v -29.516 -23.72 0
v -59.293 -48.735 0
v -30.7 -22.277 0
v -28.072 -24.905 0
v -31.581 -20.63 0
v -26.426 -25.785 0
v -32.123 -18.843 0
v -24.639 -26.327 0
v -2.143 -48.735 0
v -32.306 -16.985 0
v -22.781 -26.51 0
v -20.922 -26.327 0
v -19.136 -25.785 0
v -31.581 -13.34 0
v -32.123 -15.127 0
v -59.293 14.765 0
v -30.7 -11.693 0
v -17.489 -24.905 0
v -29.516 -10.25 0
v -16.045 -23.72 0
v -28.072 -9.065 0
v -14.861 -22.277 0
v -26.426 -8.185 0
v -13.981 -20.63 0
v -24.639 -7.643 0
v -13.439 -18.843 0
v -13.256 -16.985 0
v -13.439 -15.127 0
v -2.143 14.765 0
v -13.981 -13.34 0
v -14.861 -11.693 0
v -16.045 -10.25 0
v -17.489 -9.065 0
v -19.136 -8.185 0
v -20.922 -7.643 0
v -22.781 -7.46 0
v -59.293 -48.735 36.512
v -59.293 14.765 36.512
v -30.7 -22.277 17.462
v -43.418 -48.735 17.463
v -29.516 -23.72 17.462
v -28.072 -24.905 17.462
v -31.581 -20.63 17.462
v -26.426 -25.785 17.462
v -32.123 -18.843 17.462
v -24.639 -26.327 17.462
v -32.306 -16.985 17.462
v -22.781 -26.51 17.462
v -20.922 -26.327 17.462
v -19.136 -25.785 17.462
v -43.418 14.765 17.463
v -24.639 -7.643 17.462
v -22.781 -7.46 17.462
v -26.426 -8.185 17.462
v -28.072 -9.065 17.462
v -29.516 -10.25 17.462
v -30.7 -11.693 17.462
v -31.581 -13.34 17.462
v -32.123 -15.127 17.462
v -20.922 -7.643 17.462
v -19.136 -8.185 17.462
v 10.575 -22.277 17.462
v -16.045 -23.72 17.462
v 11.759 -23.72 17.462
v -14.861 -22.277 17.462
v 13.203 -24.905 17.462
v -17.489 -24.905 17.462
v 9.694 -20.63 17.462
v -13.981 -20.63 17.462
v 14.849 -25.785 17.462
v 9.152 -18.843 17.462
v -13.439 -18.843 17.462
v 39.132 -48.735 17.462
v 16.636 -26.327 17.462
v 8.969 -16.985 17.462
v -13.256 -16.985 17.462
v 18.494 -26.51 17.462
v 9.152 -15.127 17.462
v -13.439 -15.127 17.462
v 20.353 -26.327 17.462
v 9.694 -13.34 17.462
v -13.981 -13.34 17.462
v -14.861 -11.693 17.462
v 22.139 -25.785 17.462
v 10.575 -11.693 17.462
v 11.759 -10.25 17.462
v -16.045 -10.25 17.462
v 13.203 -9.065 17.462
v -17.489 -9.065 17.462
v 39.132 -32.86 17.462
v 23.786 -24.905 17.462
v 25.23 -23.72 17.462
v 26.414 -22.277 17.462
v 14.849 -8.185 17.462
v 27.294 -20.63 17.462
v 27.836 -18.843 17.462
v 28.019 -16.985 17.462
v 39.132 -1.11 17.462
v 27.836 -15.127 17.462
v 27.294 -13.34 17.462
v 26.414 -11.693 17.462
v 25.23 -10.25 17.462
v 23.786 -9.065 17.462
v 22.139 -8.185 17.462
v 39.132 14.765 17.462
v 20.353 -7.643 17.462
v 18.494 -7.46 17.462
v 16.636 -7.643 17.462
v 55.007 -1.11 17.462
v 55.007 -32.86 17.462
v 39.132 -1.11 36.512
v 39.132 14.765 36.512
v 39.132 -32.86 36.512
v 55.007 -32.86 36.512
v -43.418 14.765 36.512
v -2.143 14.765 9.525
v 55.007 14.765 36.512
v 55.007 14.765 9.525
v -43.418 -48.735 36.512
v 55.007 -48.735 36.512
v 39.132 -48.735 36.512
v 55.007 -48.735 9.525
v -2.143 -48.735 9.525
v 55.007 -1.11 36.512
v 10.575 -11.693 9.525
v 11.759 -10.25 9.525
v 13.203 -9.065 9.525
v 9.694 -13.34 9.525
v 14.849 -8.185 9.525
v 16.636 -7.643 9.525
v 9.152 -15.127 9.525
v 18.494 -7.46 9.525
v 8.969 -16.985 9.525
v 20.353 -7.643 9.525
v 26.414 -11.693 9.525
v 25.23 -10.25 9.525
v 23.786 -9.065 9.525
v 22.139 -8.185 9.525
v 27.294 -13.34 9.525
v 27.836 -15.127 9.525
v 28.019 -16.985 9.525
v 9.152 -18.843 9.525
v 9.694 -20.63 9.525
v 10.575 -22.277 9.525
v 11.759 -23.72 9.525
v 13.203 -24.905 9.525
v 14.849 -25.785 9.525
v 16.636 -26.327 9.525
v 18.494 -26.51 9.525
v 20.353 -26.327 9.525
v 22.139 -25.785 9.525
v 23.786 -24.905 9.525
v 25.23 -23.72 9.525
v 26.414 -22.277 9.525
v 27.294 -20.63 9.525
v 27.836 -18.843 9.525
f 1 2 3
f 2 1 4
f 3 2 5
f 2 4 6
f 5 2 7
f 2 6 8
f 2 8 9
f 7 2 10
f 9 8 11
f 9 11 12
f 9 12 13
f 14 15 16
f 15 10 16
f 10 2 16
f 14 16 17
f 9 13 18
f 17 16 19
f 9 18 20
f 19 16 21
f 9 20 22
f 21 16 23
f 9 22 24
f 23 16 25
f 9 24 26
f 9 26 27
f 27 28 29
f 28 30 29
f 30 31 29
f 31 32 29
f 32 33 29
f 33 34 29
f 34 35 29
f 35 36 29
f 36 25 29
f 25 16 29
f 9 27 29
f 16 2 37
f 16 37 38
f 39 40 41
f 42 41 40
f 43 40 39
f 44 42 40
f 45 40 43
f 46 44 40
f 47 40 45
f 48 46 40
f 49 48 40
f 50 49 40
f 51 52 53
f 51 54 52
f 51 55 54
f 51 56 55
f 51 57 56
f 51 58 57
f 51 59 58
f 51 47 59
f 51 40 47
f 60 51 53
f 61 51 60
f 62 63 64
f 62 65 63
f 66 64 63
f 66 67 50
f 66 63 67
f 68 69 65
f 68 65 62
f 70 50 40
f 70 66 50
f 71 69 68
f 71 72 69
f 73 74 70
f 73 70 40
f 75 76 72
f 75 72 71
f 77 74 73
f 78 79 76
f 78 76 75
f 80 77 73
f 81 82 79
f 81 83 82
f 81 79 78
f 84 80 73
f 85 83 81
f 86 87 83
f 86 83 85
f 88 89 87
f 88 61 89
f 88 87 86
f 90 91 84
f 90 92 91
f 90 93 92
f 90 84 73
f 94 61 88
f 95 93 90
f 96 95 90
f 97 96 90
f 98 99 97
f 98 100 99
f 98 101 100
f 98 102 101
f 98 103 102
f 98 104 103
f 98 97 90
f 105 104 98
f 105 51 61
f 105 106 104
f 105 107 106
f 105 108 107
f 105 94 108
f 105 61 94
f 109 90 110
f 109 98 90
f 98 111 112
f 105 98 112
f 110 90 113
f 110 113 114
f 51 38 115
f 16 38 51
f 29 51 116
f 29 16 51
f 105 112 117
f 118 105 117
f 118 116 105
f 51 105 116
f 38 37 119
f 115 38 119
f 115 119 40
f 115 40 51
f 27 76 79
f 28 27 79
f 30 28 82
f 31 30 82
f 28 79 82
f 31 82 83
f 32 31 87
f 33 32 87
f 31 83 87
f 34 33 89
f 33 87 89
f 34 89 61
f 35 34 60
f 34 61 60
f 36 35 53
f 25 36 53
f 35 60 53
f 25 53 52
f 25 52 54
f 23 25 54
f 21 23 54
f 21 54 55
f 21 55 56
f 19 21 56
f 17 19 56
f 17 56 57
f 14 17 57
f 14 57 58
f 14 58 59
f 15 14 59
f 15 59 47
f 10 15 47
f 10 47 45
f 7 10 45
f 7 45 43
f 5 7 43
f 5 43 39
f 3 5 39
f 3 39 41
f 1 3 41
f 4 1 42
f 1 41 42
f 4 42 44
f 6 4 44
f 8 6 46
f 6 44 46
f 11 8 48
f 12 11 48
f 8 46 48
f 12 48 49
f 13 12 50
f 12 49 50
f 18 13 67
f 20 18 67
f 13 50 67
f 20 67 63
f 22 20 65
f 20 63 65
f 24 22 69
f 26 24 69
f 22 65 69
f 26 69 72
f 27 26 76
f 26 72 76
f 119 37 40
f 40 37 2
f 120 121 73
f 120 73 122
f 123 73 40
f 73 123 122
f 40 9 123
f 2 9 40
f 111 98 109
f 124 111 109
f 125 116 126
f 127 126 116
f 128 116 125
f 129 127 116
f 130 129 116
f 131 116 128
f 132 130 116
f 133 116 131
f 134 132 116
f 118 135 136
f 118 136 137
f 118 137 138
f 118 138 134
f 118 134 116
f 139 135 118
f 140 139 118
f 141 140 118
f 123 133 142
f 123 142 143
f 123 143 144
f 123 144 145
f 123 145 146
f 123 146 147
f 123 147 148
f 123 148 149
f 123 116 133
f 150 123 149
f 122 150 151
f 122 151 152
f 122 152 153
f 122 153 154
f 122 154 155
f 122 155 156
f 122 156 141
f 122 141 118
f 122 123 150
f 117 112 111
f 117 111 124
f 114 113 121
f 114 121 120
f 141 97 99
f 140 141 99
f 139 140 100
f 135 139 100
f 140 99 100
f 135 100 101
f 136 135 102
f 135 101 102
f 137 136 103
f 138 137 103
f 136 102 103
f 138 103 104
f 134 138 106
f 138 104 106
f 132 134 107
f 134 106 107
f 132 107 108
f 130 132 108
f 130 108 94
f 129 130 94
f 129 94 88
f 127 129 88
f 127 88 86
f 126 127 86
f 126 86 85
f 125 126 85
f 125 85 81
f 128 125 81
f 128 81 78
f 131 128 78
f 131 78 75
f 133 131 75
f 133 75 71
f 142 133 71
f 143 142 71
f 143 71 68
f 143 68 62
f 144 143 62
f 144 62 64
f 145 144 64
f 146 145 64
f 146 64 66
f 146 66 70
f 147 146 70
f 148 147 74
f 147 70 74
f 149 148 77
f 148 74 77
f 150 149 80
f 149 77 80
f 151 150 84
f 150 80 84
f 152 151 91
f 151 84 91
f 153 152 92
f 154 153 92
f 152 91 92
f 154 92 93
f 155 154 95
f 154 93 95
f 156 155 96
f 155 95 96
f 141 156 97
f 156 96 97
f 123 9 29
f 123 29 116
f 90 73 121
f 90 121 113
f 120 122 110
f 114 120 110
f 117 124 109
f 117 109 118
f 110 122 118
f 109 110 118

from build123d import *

# Parameters (mm, degrees)
F0_W     = 114.3
F0_H     = 63.5
F1_DEPTH = 36.5125
F2_W     = 57.15
F2_H     = 9.525
F3_DEPTH = 63.501
F4_W     = 98.425
F4_H     = 63.5
F5_DEPTH = 19.05
F6_W     = 15.875
F6_H     = 15.875
F7_DEPTH = 19.05
F8_R     = 9.525
F9_DEPTH = 17.4635


with BuildPart() as f1:
    # F0 (on Top) → F1 (new body)
    with BuildSketch(Plane.XY):
        with Locations((-2.143128, -16.985219)):
            Rectangle(F0_W, F0_H)
    extrude(amount=F1_DEPTH)

    # F2 (on face) → F3 (cut, through all)
    with BuildSketch(Plane.XZ.offset(48.735219)):
        with Locations((26.431872, 4.7625)):
            Rectangle(F2_W, F2_H)
    extrude(amount=-F3_DEPTH, mode=Mode.SUBTRACT)

    # F4 (on face) → F5 (cut)
    with BuildSketch(Plane.XY.offset(36.5125)):
        with Locations((5.794372, -16.985219)):
            Rectangle(F4_W, F4_H)
    extrude(amount=-F5_DEPTH, mode=Mode.SUBTRACT)

    # F6 (on face) → F7 (join)
    with BuildSketch(Plane.XY.offset(17.4625)):
        with Locations((47.069372, 6.827281)):
            Rectangle(F6_W, F6_H)
        with Locations((47.069372, -40.797719)):
            Rectangle(F6_W, F6_H)
    extrude(amount=F7_DEPTH)

    # F8 (on face) → F9 (cut, through all)
    with BuildSketch(Plane.XY.offset(17.4625)):
        with Locations((-22.780628, -16.985219)):
            Circle(F8_R)
        with Locations((18.494372, -16.985219)):
            Circle(F8_R)
    extrude(amount=-F9_DEPTH, mode=Mode.SUBTRACT)


solid = f1.part
